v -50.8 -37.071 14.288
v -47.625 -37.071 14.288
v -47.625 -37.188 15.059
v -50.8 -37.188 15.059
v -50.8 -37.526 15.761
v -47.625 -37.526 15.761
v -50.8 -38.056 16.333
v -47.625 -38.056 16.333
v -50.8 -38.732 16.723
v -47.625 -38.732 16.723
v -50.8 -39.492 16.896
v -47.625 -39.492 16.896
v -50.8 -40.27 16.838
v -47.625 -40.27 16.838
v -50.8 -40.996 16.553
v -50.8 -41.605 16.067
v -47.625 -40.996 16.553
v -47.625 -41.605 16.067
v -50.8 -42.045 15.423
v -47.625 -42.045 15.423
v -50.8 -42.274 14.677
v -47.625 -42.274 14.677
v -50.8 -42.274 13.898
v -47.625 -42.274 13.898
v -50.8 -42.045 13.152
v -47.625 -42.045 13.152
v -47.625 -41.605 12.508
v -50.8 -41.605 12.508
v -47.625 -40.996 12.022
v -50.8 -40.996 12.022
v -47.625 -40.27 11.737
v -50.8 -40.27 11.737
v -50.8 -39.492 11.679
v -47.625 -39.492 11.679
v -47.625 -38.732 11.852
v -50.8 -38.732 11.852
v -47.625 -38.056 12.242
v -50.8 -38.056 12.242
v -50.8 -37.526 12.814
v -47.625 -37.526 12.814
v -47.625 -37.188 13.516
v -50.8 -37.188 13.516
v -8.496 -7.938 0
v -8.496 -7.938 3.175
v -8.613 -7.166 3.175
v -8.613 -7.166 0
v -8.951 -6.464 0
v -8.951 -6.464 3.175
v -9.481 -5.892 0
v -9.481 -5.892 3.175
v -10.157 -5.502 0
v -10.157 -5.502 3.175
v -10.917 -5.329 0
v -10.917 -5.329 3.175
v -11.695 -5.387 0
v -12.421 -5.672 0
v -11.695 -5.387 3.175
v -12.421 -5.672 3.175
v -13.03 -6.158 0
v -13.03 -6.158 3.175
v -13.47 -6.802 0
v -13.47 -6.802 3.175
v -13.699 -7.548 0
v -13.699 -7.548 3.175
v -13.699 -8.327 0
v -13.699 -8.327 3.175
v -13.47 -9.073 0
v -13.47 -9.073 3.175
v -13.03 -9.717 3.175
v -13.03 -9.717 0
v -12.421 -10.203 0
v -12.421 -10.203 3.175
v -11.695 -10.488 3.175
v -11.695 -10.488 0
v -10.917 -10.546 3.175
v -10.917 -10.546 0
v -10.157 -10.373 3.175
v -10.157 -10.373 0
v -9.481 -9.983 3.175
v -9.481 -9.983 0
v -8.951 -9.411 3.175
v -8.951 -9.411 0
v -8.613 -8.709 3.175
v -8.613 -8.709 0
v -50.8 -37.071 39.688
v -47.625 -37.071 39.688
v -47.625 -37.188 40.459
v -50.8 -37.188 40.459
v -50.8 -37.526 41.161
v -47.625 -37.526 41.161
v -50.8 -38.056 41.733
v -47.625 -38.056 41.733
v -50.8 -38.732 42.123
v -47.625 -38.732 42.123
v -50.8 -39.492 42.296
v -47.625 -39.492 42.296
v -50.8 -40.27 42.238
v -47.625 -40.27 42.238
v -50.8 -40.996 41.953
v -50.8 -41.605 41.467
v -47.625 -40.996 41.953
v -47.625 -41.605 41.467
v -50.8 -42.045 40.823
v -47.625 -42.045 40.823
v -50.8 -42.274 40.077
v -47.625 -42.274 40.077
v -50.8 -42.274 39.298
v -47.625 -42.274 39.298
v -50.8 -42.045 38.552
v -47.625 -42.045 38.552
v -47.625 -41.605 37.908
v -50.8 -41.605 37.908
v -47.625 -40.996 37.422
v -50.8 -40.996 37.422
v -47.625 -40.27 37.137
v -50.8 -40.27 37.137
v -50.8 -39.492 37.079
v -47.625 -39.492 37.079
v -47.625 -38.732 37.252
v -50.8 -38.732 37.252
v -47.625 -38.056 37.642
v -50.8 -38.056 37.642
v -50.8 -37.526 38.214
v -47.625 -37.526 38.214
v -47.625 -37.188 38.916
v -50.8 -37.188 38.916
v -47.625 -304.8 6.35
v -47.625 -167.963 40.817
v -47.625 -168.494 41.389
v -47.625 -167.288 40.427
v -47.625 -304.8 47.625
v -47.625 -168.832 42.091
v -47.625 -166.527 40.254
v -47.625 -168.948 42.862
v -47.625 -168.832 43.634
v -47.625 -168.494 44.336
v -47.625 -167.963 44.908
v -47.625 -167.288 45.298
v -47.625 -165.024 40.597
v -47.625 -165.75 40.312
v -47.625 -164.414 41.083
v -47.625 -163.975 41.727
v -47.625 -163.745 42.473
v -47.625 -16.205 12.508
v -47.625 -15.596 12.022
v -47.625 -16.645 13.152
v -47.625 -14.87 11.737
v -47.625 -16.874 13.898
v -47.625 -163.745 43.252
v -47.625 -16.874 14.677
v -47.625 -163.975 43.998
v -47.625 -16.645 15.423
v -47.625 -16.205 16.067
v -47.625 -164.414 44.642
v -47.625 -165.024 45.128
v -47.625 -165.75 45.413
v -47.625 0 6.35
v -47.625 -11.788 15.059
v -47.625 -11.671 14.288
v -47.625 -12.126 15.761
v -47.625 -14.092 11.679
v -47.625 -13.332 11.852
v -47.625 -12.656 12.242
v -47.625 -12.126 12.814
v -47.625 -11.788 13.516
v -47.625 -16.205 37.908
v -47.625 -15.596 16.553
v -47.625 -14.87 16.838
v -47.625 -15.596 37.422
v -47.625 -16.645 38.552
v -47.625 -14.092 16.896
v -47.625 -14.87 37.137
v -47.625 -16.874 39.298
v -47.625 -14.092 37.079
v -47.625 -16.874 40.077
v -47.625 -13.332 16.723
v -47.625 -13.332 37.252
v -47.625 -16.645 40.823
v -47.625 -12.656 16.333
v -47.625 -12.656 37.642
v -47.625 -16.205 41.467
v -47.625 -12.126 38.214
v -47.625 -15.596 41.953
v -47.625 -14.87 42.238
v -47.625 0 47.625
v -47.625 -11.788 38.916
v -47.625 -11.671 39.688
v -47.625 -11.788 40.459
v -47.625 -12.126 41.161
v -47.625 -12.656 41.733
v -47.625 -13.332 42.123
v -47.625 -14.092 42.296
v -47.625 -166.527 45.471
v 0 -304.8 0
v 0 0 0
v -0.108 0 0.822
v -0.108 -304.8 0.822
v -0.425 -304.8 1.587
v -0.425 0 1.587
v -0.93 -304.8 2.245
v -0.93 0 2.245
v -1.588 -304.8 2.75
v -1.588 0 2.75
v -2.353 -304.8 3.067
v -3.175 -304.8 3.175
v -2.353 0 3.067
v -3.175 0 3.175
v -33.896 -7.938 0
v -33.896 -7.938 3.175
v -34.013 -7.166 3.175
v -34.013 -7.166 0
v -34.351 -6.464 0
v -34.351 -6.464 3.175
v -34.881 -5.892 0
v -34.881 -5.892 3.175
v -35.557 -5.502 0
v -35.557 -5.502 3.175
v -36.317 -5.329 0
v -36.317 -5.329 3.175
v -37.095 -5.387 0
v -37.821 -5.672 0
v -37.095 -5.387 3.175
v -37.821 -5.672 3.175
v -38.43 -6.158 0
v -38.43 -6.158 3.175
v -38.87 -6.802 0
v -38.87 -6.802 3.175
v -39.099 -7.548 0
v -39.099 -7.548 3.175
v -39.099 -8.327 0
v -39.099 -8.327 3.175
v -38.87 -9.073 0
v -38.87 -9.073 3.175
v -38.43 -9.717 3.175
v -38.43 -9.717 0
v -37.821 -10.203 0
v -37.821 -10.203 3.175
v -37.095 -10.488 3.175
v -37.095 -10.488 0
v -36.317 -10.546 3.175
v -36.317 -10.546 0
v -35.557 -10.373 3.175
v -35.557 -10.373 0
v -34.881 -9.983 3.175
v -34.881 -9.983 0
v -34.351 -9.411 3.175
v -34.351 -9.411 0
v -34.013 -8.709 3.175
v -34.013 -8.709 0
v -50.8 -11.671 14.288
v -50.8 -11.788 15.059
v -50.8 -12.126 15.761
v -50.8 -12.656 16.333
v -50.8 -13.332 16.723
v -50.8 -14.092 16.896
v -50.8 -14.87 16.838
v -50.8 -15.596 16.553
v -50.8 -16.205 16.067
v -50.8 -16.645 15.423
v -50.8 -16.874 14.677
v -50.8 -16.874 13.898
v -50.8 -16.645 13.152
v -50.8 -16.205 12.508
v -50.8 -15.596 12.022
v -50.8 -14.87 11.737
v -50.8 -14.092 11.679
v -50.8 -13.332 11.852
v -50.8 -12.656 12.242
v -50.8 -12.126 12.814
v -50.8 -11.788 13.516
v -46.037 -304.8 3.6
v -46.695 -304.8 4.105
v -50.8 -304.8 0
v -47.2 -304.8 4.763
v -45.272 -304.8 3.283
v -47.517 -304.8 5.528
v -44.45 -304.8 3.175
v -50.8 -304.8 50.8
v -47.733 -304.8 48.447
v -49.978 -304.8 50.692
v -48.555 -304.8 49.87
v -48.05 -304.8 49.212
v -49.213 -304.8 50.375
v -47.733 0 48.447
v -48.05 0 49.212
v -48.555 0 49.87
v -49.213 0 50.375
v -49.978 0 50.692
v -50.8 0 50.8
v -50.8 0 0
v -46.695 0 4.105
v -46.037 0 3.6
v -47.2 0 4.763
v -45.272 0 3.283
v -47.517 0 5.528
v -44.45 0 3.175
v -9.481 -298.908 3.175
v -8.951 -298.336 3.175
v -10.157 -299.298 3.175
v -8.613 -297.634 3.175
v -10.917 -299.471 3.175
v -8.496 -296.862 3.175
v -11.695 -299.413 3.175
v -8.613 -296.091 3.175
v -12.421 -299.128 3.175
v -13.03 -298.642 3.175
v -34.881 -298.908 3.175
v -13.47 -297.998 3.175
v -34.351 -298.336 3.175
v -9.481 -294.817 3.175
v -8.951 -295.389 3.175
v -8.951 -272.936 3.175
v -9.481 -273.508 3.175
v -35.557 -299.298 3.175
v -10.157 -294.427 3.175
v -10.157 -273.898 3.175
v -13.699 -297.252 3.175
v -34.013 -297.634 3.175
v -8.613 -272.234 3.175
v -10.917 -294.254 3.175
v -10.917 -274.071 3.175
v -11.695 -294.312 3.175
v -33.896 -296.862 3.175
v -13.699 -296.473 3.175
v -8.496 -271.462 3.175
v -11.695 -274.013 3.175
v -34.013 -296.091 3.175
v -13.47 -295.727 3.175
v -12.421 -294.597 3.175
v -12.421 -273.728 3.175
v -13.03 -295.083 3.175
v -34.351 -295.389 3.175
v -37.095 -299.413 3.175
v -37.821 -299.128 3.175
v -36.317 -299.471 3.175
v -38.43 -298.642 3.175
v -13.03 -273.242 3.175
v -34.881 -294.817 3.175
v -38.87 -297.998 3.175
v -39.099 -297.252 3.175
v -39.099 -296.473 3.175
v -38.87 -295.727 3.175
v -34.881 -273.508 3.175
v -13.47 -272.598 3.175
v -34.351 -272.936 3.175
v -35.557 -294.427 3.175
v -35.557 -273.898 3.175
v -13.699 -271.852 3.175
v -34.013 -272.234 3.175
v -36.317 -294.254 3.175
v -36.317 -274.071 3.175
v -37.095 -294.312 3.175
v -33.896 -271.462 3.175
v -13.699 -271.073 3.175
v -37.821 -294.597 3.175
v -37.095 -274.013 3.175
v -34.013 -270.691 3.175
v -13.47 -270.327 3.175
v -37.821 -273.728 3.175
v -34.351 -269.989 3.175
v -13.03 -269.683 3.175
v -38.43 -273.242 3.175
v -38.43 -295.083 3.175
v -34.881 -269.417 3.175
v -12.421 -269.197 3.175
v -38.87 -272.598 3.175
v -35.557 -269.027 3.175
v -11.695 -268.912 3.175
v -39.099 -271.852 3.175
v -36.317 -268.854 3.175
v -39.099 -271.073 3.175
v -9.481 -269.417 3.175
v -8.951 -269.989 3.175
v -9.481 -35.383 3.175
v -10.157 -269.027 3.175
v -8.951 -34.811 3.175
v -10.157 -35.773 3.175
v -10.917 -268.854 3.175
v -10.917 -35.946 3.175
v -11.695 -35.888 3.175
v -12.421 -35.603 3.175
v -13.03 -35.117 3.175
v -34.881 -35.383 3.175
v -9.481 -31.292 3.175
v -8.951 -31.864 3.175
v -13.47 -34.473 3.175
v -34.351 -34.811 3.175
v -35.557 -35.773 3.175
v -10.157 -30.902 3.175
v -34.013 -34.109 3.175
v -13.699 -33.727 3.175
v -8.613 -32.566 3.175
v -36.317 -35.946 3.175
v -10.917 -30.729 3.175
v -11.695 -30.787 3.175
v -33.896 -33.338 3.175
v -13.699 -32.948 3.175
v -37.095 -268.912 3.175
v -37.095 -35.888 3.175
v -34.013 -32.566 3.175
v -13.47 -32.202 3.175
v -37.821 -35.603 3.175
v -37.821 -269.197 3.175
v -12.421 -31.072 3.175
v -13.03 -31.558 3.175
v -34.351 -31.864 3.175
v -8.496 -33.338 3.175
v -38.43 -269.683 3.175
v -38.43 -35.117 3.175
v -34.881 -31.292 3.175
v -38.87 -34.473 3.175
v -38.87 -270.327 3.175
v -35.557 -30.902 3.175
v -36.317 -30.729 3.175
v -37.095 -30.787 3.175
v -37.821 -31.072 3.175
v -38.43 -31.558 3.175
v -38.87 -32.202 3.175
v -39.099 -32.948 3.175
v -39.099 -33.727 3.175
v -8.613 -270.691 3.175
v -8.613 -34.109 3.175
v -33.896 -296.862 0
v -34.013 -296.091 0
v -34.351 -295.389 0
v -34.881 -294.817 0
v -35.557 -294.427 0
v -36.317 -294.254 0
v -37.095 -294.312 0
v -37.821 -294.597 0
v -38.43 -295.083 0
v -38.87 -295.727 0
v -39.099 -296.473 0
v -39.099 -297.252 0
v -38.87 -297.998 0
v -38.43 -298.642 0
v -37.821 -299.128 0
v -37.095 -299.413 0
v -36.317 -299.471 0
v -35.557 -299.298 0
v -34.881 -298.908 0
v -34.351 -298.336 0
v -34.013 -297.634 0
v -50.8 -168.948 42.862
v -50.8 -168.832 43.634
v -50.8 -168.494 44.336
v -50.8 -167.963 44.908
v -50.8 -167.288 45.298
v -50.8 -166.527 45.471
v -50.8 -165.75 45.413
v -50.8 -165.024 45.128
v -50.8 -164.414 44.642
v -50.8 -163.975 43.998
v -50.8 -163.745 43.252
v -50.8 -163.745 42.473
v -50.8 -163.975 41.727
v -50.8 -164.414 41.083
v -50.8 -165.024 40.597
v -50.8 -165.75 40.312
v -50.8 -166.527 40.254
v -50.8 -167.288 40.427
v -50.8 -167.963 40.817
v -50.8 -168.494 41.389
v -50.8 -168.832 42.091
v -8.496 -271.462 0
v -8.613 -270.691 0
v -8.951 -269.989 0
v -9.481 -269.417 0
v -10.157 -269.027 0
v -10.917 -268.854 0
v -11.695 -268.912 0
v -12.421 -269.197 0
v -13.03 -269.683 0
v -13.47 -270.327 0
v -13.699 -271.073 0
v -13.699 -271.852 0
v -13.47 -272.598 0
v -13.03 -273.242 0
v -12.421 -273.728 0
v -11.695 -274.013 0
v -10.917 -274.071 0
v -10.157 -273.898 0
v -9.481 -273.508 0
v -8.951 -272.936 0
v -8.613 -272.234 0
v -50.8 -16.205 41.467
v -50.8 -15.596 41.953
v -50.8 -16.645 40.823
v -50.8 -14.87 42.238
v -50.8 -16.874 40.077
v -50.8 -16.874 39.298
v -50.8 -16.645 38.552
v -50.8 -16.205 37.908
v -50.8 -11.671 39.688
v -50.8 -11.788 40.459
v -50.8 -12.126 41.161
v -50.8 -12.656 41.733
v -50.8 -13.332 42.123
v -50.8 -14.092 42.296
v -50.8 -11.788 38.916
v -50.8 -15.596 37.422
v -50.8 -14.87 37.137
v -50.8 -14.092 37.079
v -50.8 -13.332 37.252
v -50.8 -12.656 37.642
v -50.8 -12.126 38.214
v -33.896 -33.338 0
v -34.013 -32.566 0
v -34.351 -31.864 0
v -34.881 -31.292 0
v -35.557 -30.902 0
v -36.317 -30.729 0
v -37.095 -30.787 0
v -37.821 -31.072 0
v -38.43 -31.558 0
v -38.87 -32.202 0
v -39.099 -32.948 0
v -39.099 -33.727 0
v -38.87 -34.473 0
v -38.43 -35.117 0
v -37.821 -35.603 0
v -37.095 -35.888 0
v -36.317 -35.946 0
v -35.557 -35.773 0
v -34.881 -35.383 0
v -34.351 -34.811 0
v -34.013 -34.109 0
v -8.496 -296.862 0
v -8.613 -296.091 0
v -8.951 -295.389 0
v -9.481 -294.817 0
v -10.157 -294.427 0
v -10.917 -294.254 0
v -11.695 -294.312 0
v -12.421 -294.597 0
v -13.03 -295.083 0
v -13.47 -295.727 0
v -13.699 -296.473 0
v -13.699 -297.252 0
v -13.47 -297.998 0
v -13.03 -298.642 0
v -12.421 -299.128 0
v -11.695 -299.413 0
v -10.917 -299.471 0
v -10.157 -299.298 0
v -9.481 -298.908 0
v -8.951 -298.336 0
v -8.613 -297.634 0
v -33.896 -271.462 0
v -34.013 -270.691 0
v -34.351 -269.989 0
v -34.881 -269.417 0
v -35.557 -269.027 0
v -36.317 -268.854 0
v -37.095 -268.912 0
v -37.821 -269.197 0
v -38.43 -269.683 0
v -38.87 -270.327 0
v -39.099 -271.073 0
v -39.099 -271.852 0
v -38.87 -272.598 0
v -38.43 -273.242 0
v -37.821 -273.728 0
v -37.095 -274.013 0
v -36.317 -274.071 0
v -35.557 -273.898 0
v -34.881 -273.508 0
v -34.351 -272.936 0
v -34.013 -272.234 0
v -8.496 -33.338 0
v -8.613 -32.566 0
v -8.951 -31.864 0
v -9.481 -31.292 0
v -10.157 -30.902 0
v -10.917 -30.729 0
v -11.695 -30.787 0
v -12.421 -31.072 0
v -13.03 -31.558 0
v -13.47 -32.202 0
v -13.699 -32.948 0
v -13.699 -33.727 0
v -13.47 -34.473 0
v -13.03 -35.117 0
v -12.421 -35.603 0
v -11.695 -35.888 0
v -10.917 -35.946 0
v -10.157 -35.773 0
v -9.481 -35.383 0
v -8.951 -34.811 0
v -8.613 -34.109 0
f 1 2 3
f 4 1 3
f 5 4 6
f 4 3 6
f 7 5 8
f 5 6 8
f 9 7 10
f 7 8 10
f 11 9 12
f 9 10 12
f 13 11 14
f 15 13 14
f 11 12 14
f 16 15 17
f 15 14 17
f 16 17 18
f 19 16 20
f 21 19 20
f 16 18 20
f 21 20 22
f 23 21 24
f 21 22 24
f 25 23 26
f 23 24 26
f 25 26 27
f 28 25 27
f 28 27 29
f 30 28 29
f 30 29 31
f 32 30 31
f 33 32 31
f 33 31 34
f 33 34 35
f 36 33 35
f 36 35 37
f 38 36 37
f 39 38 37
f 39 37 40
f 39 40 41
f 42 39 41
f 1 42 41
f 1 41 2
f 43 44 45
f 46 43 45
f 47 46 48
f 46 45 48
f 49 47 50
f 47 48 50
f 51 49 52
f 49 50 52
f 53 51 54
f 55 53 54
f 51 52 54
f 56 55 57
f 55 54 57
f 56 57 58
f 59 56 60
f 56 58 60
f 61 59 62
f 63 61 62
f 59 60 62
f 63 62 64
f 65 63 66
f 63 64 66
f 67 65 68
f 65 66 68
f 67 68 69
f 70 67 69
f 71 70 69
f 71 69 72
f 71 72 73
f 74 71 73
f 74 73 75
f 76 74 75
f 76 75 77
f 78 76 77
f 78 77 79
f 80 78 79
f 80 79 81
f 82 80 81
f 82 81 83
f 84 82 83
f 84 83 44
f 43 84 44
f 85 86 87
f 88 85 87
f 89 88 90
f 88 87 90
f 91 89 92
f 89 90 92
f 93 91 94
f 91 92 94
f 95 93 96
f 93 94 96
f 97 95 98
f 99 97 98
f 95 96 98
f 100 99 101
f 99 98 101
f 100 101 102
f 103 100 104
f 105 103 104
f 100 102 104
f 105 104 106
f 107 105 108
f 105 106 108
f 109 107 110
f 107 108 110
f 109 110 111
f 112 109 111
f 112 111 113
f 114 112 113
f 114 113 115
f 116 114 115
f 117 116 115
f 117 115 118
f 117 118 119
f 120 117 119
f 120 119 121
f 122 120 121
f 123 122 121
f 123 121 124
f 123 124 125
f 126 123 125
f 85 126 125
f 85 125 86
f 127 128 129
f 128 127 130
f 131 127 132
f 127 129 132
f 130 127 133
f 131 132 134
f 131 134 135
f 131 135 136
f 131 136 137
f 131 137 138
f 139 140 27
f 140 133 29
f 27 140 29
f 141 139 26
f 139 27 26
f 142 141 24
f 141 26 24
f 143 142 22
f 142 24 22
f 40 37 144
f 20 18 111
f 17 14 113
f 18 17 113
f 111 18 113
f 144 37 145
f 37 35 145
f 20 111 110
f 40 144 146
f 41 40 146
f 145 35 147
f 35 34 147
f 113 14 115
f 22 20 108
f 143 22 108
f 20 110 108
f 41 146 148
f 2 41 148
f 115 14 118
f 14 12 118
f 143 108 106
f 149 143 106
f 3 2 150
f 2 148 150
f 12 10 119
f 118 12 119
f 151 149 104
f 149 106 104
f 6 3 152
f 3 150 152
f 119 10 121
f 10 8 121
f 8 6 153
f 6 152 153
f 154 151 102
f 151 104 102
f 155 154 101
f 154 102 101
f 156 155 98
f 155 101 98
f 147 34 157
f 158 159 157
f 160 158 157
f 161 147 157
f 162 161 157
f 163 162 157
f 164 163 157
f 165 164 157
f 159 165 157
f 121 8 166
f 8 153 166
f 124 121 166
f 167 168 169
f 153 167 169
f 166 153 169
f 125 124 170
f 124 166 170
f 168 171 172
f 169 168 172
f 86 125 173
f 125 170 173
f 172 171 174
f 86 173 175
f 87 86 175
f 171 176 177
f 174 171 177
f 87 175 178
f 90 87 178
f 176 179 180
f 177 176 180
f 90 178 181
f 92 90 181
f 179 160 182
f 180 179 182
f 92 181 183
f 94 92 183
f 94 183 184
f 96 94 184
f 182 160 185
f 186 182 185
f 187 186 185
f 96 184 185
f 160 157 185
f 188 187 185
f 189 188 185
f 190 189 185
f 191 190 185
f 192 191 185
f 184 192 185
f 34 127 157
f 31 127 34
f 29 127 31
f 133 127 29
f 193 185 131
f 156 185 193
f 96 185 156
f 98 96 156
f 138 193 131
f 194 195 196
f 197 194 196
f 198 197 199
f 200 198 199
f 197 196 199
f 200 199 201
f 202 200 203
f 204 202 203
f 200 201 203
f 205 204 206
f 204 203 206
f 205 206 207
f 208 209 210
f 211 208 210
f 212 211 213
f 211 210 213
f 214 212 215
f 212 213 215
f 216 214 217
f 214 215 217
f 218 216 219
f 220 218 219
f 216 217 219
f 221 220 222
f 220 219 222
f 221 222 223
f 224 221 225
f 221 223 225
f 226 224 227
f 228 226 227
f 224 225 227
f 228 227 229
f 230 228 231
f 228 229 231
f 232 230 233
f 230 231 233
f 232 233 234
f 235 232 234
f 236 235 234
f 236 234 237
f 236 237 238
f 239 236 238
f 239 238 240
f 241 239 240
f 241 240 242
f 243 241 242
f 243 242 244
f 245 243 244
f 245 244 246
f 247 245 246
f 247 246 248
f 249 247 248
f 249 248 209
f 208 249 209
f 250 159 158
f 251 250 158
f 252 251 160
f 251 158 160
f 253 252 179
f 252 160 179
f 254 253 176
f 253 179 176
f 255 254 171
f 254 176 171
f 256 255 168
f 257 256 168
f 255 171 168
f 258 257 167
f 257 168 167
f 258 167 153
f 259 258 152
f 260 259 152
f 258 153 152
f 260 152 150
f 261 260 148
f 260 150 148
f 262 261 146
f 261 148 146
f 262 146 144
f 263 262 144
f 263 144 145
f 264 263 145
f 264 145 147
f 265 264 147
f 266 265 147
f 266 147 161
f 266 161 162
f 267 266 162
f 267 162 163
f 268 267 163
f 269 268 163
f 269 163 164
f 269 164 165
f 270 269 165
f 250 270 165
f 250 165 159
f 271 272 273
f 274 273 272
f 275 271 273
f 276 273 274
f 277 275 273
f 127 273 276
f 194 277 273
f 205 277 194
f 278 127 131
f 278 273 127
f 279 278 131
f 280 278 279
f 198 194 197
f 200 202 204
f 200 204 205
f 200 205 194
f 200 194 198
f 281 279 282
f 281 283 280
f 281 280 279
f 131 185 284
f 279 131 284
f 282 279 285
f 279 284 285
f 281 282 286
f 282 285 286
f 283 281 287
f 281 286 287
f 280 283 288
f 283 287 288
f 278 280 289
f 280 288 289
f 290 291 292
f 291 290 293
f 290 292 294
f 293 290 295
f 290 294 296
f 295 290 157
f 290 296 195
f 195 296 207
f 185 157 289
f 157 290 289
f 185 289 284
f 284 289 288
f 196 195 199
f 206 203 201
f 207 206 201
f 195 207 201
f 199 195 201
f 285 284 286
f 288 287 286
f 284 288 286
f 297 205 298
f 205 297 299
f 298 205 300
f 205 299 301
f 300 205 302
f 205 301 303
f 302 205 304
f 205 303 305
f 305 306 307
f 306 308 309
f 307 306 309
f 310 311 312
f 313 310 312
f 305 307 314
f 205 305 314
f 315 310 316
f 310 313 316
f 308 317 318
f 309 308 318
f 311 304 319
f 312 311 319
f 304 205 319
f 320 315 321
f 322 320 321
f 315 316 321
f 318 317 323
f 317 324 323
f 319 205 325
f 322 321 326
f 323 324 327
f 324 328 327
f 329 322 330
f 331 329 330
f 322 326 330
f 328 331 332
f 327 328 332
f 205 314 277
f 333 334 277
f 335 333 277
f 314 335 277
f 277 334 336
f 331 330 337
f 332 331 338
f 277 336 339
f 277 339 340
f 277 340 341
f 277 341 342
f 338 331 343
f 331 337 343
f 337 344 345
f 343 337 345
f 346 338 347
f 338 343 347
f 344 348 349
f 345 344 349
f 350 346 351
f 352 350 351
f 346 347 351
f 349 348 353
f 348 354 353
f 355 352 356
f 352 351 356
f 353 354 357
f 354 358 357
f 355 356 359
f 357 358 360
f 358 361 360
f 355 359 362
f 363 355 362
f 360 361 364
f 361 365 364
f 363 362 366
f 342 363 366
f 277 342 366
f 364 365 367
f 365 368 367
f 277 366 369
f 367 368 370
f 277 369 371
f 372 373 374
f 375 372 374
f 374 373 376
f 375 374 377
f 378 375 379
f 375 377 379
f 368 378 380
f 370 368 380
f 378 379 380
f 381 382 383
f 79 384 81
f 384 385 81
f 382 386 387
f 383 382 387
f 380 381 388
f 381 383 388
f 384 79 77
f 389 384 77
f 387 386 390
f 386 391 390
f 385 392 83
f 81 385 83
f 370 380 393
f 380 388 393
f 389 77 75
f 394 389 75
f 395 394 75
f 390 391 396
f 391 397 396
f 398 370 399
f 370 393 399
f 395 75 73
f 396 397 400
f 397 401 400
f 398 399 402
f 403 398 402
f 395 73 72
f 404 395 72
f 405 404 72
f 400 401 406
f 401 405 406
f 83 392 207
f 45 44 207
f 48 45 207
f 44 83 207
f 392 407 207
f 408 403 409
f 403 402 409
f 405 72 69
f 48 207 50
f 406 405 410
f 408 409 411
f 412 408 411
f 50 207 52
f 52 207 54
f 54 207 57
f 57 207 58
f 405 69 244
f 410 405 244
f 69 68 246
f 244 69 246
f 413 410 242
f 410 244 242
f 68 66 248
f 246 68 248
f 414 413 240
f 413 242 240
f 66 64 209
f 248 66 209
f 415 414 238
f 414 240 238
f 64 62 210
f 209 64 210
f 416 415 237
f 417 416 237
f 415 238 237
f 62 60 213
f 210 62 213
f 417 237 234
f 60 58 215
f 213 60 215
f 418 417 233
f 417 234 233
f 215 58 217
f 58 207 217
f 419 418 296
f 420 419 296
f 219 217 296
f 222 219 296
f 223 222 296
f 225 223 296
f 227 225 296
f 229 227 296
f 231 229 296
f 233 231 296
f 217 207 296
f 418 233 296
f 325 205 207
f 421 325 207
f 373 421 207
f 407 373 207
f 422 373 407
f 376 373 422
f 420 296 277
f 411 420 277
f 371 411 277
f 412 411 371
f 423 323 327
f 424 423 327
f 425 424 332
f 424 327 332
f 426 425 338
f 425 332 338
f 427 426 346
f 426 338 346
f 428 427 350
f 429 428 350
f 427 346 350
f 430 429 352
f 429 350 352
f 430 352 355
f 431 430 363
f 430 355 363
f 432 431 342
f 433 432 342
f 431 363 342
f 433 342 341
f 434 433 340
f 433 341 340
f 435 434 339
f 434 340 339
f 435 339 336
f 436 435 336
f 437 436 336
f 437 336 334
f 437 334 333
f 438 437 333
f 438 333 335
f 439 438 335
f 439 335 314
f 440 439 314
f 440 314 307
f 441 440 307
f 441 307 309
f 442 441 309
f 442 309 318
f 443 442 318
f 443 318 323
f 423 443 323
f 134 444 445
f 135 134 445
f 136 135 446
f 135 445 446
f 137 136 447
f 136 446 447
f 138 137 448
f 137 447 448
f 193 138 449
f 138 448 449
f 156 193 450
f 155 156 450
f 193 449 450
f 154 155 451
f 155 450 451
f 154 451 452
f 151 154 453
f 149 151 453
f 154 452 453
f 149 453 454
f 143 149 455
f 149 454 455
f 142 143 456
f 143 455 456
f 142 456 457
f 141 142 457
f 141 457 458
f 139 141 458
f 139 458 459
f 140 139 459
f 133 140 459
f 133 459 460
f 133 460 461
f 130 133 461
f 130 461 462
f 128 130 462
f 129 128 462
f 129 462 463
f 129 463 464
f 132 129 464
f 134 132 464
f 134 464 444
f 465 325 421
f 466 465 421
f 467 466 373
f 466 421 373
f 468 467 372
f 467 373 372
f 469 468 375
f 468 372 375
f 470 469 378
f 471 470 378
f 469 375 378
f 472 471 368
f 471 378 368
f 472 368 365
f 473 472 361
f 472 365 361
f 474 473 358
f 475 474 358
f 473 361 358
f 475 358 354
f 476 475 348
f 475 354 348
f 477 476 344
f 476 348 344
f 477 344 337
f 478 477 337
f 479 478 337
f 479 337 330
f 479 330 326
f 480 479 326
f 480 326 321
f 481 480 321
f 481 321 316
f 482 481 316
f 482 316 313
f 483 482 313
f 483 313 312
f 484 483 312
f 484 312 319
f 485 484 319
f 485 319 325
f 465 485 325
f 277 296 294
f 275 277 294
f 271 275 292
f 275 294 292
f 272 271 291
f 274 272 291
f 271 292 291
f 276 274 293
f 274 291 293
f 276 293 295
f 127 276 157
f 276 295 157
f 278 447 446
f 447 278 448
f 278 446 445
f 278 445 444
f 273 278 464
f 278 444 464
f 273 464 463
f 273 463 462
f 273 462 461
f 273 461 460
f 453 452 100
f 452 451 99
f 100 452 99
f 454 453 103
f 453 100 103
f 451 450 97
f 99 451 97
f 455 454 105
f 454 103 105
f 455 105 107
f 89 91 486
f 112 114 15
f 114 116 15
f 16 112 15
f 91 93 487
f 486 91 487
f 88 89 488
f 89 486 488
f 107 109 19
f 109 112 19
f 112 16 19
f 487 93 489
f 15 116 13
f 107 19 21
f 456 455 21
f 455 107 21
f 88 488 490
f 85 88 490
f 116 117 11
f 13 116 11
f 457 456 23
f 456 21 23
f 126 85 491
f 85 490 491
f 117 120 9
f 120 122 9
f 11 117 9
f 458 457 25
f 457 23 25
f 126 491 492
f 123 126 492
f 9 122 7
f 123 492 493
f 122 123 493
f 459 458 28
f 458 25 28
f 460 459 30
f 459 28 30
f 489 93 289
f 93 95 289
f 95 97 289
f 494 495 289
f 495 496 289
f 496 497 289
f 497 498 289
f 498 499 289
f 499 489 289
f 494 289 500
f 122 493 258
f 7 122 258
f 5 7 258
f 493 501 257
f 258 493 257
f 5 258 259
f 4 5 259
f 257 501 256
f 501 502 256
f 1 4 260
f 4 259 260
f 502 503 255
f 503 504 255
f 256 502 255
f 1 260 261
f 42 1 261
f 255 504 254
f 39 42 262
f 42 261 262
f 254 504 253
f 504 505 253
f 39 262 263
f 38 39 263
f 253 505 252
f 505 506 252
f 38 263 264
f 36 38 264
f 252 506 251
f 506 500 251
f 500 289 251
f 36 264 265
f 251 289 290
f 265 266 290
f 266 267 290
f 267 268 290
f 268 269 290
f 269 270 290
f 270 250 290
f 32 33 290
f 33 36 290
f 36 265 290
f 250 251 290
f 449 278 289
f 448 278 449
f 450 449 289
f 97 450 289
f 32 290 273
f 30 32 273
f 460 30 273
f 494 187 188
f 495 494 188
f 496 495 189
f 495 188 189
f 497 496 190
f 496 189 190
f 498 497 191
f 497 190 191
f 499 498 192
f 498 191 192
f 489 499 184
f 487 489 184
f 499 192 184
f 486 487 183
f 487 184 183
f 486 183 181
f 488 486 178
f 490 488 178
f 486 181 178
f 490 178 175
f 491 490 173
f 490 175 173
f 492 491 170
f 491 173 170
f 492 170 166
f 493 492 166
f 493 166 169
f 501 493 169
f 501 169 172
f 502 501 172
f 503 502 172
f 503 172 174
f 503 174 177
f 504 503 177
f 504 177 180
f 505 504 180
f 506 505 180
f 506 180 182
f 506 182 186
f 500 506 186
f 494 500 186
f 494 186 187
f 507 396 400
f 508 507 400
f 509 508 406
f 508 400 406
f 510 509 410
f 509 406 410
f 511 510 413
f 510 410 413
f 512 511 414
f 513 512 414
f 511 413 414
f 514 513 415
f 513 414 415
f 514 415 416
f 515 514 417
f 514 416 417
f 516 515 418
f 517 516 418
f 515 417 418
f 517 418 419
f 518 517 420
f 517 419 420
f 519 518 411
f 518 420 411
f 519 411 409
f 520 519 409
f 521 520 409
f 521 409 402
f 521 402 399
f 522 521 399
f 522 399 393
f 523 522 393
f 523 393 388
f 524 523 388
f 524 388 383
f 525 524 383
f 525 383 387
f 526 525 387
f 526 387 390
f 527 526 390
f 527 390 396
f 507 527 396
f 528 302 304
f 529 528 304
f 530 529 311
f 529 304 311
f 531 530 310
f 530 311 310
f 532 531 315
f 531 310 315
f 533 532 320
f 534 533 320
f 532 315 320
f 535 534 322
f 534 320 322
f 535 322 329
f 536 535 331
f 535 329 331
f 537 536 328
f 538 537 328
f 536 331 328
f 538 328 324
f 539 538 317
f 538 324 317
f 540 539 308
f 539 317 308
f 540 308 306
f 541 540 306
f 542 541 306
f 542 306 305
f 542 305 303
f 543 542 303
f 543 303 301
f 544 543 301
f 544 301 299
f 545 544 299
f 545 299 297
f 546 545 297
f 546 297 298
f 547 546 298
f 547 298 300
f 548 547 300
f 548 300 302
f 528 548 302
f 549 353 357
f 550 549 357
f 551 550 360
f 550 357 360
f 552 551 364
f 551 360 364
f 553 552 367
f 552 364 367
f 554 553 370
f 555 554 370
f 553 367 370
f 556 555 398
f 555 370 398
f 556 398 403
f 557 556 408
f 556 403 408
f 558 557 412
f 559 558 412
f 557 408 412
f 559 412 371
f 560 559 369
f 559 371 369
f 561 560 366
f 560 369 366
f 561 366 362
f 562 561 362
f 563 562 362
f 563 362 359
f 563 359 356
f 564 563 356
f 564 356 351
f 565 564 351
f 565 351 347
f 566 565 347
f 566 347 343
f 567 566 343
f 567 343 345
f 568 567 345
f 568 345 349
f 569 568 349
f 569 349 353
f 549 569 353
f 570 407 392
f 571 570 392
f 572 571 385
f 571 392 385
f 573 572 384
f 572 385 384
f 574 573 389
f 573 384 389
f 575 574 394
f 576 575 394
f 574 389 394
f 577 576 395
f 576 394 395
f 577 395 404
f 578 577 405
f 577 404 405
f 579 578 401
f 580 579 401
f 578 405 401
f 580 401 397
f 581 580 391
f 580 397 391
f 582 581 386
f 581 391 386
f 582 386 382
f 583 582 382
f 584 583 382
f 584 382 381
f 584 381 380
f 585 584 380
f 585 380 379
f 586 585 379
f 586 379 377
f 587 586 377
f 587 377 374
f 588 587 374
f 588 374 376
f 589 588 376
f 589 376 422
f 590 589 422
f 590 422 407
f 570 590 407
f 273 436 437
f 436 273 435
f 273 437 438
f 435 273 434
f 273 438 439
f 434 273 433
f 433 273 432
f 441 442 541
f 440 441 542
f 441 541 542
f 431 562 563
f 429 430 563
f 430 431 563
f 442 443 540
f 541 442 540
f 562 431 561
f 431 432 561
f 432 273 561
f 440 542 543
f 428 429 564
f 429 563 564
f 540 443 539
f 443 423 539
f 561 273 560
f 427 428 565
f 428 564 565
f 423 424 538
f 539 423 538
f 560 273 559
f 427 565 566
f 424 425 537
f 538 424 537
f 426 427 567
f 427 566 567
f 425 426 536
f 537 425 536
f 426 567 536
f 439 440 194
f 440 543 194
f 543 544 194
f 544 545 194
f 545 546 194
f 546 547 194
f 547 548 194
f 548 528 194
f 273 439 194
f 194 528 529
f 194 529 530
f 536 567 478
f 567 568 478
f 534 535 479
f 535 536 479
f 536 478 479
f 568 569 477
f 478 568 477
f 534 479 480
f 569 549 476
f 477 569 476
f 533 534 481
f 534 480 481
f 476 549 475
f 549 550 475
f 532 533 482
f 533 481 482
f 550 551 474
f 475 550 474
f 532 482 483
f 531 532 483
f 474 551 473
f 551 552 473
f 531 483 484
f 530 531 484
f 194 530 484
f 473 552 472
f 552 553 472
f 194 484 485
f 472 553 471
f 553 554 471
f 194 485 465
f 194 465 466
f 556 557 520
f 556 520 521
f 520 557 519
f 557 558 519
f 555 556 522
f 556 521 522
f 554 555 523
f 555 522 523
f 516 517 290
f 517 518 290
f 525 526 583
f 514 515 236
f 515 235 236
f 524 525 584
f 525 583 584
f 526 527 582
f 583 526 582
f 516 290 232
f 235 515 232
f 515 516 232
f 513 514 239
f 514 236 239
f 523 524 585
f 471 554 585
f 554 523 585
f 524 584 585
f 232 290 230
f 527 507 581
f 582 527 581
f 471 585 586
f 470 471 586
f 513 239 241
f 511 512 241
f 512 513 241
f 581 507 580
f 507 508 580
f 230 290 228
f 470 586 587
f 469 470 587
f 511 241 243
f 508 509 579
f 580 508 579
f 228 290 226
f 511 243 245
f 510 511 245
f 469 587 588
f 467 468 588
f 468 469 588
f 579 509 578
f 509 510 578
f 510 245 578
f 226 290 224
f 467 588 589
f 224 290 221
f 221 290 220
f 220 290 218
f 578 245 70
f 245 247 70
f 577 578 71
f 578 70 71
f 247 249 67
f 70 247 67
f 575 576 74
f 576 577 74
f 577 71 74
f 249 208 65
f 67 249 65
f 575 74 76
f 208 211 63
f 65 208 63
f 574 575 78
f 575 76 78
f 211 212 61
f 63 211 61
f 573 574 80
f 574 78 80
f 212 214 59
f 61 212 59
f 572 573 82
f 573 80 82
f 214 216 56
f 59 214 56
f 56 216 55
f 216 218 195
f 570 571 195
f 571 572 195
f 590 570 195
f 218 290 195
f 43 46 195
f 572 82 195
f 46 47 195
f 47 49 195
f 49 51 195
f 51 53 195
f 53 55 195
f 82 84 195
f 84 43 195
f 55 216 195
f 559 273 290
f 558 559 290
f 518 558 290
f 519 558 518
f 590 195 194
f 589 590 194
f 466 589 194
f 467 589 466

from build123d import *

# Parameters (mm, degrees)
F1_DEPTH = 304.8
F2_R     = 2.6162
F3_DEPTH = 3.176
F4_R     = 2.6162
F5_DEPTH = 3.176
F6_R     = 2.6162
F7_DEPTH = 50.801


with BuildPart() as f1:
    # F0 (on Front) → F1 (new body)
    with BuildSketch(Plane.XZ):
        with BuildLine():
            Line((-50.8, 0), (0, 0))
            ThreePointArc((0, 0), (-0.929936, 2.245064), (-3.175, 3.175))
            Line((-3.175, 3.175), (-44.45, 3.175))
            ThreePointArc((-44.45, 3.175), (-46.695064, 4.104936), (-47.625, 6.35))
            Line((-47.625, 6.35), (-47.625, 47.625))
            ThreePointArc((-47.625, 47.625), (-48.554936, 49.870064), (-50.8, 50.8))
            Line((-50.8, 50.8), (-50.8, 0))
        make_face()
    extrude(amount=F1_DEPTH)

    # F2 (on face) → F3 (cut, through all)
    with BuildSketch(Plane.YZ.offset(-47.625)):
        with Locations((-14.2875, 14.2875)):
            Circle(F2_R)
        with Locations((-39.6875, 14.2875)):
            Circle(F2_R)
        with Locations((-14.2875, 39.6875)):
            Circle(F2_R)
        with Locations((-39.6875, 39.6875)):
            Circle(F2_R)
    extrude(amount=-F3_DEPTH, mode=Mode.SUBTRACT)

    # F4 (on face) → F5 (cut, through all)
    with BuildSketch(Plane.XY.offset(3.175)):
        with Locations((-36.5125, -296.8625)):
            Circle(F4_R)
        with Locations((-36.5125, -7.9375)):
            Circle(F4_R)
        with Locations((-11.1125, -7.9375)):
            Circle(F4_R)
        with Locations((-11.1125, -296.8625)):
            Circle(F4_R)
        with Locations((-11.1125, -271.4625)):
            Circle(F4_R)
        with Locations((-36.5125, -271.4625)):
            Circle(F4_R)
        with Locations((-11.1125, -33.3375)):
            Circle(F4_R)
        with Locations((-36.5125, -33.3375)):
            Circle(F4_R)
    extrude(amount=-F5_DEPTH, mode=Mode.SUBTRACT)

    # F6 (on face) → F7 (cut, through all)
    with BuildSketch(Plane(origin=(-50.8, 0, 0), x_dir=(0, -1, 0), z_dir=(-1, 0, 0))):
        with Locations((166.3319, 42.8625)):
            Circle(F6_R)
    extrude(amount=-F7_DEPTH, mode=Mode.SUBTRACT)


solid = f1.part
